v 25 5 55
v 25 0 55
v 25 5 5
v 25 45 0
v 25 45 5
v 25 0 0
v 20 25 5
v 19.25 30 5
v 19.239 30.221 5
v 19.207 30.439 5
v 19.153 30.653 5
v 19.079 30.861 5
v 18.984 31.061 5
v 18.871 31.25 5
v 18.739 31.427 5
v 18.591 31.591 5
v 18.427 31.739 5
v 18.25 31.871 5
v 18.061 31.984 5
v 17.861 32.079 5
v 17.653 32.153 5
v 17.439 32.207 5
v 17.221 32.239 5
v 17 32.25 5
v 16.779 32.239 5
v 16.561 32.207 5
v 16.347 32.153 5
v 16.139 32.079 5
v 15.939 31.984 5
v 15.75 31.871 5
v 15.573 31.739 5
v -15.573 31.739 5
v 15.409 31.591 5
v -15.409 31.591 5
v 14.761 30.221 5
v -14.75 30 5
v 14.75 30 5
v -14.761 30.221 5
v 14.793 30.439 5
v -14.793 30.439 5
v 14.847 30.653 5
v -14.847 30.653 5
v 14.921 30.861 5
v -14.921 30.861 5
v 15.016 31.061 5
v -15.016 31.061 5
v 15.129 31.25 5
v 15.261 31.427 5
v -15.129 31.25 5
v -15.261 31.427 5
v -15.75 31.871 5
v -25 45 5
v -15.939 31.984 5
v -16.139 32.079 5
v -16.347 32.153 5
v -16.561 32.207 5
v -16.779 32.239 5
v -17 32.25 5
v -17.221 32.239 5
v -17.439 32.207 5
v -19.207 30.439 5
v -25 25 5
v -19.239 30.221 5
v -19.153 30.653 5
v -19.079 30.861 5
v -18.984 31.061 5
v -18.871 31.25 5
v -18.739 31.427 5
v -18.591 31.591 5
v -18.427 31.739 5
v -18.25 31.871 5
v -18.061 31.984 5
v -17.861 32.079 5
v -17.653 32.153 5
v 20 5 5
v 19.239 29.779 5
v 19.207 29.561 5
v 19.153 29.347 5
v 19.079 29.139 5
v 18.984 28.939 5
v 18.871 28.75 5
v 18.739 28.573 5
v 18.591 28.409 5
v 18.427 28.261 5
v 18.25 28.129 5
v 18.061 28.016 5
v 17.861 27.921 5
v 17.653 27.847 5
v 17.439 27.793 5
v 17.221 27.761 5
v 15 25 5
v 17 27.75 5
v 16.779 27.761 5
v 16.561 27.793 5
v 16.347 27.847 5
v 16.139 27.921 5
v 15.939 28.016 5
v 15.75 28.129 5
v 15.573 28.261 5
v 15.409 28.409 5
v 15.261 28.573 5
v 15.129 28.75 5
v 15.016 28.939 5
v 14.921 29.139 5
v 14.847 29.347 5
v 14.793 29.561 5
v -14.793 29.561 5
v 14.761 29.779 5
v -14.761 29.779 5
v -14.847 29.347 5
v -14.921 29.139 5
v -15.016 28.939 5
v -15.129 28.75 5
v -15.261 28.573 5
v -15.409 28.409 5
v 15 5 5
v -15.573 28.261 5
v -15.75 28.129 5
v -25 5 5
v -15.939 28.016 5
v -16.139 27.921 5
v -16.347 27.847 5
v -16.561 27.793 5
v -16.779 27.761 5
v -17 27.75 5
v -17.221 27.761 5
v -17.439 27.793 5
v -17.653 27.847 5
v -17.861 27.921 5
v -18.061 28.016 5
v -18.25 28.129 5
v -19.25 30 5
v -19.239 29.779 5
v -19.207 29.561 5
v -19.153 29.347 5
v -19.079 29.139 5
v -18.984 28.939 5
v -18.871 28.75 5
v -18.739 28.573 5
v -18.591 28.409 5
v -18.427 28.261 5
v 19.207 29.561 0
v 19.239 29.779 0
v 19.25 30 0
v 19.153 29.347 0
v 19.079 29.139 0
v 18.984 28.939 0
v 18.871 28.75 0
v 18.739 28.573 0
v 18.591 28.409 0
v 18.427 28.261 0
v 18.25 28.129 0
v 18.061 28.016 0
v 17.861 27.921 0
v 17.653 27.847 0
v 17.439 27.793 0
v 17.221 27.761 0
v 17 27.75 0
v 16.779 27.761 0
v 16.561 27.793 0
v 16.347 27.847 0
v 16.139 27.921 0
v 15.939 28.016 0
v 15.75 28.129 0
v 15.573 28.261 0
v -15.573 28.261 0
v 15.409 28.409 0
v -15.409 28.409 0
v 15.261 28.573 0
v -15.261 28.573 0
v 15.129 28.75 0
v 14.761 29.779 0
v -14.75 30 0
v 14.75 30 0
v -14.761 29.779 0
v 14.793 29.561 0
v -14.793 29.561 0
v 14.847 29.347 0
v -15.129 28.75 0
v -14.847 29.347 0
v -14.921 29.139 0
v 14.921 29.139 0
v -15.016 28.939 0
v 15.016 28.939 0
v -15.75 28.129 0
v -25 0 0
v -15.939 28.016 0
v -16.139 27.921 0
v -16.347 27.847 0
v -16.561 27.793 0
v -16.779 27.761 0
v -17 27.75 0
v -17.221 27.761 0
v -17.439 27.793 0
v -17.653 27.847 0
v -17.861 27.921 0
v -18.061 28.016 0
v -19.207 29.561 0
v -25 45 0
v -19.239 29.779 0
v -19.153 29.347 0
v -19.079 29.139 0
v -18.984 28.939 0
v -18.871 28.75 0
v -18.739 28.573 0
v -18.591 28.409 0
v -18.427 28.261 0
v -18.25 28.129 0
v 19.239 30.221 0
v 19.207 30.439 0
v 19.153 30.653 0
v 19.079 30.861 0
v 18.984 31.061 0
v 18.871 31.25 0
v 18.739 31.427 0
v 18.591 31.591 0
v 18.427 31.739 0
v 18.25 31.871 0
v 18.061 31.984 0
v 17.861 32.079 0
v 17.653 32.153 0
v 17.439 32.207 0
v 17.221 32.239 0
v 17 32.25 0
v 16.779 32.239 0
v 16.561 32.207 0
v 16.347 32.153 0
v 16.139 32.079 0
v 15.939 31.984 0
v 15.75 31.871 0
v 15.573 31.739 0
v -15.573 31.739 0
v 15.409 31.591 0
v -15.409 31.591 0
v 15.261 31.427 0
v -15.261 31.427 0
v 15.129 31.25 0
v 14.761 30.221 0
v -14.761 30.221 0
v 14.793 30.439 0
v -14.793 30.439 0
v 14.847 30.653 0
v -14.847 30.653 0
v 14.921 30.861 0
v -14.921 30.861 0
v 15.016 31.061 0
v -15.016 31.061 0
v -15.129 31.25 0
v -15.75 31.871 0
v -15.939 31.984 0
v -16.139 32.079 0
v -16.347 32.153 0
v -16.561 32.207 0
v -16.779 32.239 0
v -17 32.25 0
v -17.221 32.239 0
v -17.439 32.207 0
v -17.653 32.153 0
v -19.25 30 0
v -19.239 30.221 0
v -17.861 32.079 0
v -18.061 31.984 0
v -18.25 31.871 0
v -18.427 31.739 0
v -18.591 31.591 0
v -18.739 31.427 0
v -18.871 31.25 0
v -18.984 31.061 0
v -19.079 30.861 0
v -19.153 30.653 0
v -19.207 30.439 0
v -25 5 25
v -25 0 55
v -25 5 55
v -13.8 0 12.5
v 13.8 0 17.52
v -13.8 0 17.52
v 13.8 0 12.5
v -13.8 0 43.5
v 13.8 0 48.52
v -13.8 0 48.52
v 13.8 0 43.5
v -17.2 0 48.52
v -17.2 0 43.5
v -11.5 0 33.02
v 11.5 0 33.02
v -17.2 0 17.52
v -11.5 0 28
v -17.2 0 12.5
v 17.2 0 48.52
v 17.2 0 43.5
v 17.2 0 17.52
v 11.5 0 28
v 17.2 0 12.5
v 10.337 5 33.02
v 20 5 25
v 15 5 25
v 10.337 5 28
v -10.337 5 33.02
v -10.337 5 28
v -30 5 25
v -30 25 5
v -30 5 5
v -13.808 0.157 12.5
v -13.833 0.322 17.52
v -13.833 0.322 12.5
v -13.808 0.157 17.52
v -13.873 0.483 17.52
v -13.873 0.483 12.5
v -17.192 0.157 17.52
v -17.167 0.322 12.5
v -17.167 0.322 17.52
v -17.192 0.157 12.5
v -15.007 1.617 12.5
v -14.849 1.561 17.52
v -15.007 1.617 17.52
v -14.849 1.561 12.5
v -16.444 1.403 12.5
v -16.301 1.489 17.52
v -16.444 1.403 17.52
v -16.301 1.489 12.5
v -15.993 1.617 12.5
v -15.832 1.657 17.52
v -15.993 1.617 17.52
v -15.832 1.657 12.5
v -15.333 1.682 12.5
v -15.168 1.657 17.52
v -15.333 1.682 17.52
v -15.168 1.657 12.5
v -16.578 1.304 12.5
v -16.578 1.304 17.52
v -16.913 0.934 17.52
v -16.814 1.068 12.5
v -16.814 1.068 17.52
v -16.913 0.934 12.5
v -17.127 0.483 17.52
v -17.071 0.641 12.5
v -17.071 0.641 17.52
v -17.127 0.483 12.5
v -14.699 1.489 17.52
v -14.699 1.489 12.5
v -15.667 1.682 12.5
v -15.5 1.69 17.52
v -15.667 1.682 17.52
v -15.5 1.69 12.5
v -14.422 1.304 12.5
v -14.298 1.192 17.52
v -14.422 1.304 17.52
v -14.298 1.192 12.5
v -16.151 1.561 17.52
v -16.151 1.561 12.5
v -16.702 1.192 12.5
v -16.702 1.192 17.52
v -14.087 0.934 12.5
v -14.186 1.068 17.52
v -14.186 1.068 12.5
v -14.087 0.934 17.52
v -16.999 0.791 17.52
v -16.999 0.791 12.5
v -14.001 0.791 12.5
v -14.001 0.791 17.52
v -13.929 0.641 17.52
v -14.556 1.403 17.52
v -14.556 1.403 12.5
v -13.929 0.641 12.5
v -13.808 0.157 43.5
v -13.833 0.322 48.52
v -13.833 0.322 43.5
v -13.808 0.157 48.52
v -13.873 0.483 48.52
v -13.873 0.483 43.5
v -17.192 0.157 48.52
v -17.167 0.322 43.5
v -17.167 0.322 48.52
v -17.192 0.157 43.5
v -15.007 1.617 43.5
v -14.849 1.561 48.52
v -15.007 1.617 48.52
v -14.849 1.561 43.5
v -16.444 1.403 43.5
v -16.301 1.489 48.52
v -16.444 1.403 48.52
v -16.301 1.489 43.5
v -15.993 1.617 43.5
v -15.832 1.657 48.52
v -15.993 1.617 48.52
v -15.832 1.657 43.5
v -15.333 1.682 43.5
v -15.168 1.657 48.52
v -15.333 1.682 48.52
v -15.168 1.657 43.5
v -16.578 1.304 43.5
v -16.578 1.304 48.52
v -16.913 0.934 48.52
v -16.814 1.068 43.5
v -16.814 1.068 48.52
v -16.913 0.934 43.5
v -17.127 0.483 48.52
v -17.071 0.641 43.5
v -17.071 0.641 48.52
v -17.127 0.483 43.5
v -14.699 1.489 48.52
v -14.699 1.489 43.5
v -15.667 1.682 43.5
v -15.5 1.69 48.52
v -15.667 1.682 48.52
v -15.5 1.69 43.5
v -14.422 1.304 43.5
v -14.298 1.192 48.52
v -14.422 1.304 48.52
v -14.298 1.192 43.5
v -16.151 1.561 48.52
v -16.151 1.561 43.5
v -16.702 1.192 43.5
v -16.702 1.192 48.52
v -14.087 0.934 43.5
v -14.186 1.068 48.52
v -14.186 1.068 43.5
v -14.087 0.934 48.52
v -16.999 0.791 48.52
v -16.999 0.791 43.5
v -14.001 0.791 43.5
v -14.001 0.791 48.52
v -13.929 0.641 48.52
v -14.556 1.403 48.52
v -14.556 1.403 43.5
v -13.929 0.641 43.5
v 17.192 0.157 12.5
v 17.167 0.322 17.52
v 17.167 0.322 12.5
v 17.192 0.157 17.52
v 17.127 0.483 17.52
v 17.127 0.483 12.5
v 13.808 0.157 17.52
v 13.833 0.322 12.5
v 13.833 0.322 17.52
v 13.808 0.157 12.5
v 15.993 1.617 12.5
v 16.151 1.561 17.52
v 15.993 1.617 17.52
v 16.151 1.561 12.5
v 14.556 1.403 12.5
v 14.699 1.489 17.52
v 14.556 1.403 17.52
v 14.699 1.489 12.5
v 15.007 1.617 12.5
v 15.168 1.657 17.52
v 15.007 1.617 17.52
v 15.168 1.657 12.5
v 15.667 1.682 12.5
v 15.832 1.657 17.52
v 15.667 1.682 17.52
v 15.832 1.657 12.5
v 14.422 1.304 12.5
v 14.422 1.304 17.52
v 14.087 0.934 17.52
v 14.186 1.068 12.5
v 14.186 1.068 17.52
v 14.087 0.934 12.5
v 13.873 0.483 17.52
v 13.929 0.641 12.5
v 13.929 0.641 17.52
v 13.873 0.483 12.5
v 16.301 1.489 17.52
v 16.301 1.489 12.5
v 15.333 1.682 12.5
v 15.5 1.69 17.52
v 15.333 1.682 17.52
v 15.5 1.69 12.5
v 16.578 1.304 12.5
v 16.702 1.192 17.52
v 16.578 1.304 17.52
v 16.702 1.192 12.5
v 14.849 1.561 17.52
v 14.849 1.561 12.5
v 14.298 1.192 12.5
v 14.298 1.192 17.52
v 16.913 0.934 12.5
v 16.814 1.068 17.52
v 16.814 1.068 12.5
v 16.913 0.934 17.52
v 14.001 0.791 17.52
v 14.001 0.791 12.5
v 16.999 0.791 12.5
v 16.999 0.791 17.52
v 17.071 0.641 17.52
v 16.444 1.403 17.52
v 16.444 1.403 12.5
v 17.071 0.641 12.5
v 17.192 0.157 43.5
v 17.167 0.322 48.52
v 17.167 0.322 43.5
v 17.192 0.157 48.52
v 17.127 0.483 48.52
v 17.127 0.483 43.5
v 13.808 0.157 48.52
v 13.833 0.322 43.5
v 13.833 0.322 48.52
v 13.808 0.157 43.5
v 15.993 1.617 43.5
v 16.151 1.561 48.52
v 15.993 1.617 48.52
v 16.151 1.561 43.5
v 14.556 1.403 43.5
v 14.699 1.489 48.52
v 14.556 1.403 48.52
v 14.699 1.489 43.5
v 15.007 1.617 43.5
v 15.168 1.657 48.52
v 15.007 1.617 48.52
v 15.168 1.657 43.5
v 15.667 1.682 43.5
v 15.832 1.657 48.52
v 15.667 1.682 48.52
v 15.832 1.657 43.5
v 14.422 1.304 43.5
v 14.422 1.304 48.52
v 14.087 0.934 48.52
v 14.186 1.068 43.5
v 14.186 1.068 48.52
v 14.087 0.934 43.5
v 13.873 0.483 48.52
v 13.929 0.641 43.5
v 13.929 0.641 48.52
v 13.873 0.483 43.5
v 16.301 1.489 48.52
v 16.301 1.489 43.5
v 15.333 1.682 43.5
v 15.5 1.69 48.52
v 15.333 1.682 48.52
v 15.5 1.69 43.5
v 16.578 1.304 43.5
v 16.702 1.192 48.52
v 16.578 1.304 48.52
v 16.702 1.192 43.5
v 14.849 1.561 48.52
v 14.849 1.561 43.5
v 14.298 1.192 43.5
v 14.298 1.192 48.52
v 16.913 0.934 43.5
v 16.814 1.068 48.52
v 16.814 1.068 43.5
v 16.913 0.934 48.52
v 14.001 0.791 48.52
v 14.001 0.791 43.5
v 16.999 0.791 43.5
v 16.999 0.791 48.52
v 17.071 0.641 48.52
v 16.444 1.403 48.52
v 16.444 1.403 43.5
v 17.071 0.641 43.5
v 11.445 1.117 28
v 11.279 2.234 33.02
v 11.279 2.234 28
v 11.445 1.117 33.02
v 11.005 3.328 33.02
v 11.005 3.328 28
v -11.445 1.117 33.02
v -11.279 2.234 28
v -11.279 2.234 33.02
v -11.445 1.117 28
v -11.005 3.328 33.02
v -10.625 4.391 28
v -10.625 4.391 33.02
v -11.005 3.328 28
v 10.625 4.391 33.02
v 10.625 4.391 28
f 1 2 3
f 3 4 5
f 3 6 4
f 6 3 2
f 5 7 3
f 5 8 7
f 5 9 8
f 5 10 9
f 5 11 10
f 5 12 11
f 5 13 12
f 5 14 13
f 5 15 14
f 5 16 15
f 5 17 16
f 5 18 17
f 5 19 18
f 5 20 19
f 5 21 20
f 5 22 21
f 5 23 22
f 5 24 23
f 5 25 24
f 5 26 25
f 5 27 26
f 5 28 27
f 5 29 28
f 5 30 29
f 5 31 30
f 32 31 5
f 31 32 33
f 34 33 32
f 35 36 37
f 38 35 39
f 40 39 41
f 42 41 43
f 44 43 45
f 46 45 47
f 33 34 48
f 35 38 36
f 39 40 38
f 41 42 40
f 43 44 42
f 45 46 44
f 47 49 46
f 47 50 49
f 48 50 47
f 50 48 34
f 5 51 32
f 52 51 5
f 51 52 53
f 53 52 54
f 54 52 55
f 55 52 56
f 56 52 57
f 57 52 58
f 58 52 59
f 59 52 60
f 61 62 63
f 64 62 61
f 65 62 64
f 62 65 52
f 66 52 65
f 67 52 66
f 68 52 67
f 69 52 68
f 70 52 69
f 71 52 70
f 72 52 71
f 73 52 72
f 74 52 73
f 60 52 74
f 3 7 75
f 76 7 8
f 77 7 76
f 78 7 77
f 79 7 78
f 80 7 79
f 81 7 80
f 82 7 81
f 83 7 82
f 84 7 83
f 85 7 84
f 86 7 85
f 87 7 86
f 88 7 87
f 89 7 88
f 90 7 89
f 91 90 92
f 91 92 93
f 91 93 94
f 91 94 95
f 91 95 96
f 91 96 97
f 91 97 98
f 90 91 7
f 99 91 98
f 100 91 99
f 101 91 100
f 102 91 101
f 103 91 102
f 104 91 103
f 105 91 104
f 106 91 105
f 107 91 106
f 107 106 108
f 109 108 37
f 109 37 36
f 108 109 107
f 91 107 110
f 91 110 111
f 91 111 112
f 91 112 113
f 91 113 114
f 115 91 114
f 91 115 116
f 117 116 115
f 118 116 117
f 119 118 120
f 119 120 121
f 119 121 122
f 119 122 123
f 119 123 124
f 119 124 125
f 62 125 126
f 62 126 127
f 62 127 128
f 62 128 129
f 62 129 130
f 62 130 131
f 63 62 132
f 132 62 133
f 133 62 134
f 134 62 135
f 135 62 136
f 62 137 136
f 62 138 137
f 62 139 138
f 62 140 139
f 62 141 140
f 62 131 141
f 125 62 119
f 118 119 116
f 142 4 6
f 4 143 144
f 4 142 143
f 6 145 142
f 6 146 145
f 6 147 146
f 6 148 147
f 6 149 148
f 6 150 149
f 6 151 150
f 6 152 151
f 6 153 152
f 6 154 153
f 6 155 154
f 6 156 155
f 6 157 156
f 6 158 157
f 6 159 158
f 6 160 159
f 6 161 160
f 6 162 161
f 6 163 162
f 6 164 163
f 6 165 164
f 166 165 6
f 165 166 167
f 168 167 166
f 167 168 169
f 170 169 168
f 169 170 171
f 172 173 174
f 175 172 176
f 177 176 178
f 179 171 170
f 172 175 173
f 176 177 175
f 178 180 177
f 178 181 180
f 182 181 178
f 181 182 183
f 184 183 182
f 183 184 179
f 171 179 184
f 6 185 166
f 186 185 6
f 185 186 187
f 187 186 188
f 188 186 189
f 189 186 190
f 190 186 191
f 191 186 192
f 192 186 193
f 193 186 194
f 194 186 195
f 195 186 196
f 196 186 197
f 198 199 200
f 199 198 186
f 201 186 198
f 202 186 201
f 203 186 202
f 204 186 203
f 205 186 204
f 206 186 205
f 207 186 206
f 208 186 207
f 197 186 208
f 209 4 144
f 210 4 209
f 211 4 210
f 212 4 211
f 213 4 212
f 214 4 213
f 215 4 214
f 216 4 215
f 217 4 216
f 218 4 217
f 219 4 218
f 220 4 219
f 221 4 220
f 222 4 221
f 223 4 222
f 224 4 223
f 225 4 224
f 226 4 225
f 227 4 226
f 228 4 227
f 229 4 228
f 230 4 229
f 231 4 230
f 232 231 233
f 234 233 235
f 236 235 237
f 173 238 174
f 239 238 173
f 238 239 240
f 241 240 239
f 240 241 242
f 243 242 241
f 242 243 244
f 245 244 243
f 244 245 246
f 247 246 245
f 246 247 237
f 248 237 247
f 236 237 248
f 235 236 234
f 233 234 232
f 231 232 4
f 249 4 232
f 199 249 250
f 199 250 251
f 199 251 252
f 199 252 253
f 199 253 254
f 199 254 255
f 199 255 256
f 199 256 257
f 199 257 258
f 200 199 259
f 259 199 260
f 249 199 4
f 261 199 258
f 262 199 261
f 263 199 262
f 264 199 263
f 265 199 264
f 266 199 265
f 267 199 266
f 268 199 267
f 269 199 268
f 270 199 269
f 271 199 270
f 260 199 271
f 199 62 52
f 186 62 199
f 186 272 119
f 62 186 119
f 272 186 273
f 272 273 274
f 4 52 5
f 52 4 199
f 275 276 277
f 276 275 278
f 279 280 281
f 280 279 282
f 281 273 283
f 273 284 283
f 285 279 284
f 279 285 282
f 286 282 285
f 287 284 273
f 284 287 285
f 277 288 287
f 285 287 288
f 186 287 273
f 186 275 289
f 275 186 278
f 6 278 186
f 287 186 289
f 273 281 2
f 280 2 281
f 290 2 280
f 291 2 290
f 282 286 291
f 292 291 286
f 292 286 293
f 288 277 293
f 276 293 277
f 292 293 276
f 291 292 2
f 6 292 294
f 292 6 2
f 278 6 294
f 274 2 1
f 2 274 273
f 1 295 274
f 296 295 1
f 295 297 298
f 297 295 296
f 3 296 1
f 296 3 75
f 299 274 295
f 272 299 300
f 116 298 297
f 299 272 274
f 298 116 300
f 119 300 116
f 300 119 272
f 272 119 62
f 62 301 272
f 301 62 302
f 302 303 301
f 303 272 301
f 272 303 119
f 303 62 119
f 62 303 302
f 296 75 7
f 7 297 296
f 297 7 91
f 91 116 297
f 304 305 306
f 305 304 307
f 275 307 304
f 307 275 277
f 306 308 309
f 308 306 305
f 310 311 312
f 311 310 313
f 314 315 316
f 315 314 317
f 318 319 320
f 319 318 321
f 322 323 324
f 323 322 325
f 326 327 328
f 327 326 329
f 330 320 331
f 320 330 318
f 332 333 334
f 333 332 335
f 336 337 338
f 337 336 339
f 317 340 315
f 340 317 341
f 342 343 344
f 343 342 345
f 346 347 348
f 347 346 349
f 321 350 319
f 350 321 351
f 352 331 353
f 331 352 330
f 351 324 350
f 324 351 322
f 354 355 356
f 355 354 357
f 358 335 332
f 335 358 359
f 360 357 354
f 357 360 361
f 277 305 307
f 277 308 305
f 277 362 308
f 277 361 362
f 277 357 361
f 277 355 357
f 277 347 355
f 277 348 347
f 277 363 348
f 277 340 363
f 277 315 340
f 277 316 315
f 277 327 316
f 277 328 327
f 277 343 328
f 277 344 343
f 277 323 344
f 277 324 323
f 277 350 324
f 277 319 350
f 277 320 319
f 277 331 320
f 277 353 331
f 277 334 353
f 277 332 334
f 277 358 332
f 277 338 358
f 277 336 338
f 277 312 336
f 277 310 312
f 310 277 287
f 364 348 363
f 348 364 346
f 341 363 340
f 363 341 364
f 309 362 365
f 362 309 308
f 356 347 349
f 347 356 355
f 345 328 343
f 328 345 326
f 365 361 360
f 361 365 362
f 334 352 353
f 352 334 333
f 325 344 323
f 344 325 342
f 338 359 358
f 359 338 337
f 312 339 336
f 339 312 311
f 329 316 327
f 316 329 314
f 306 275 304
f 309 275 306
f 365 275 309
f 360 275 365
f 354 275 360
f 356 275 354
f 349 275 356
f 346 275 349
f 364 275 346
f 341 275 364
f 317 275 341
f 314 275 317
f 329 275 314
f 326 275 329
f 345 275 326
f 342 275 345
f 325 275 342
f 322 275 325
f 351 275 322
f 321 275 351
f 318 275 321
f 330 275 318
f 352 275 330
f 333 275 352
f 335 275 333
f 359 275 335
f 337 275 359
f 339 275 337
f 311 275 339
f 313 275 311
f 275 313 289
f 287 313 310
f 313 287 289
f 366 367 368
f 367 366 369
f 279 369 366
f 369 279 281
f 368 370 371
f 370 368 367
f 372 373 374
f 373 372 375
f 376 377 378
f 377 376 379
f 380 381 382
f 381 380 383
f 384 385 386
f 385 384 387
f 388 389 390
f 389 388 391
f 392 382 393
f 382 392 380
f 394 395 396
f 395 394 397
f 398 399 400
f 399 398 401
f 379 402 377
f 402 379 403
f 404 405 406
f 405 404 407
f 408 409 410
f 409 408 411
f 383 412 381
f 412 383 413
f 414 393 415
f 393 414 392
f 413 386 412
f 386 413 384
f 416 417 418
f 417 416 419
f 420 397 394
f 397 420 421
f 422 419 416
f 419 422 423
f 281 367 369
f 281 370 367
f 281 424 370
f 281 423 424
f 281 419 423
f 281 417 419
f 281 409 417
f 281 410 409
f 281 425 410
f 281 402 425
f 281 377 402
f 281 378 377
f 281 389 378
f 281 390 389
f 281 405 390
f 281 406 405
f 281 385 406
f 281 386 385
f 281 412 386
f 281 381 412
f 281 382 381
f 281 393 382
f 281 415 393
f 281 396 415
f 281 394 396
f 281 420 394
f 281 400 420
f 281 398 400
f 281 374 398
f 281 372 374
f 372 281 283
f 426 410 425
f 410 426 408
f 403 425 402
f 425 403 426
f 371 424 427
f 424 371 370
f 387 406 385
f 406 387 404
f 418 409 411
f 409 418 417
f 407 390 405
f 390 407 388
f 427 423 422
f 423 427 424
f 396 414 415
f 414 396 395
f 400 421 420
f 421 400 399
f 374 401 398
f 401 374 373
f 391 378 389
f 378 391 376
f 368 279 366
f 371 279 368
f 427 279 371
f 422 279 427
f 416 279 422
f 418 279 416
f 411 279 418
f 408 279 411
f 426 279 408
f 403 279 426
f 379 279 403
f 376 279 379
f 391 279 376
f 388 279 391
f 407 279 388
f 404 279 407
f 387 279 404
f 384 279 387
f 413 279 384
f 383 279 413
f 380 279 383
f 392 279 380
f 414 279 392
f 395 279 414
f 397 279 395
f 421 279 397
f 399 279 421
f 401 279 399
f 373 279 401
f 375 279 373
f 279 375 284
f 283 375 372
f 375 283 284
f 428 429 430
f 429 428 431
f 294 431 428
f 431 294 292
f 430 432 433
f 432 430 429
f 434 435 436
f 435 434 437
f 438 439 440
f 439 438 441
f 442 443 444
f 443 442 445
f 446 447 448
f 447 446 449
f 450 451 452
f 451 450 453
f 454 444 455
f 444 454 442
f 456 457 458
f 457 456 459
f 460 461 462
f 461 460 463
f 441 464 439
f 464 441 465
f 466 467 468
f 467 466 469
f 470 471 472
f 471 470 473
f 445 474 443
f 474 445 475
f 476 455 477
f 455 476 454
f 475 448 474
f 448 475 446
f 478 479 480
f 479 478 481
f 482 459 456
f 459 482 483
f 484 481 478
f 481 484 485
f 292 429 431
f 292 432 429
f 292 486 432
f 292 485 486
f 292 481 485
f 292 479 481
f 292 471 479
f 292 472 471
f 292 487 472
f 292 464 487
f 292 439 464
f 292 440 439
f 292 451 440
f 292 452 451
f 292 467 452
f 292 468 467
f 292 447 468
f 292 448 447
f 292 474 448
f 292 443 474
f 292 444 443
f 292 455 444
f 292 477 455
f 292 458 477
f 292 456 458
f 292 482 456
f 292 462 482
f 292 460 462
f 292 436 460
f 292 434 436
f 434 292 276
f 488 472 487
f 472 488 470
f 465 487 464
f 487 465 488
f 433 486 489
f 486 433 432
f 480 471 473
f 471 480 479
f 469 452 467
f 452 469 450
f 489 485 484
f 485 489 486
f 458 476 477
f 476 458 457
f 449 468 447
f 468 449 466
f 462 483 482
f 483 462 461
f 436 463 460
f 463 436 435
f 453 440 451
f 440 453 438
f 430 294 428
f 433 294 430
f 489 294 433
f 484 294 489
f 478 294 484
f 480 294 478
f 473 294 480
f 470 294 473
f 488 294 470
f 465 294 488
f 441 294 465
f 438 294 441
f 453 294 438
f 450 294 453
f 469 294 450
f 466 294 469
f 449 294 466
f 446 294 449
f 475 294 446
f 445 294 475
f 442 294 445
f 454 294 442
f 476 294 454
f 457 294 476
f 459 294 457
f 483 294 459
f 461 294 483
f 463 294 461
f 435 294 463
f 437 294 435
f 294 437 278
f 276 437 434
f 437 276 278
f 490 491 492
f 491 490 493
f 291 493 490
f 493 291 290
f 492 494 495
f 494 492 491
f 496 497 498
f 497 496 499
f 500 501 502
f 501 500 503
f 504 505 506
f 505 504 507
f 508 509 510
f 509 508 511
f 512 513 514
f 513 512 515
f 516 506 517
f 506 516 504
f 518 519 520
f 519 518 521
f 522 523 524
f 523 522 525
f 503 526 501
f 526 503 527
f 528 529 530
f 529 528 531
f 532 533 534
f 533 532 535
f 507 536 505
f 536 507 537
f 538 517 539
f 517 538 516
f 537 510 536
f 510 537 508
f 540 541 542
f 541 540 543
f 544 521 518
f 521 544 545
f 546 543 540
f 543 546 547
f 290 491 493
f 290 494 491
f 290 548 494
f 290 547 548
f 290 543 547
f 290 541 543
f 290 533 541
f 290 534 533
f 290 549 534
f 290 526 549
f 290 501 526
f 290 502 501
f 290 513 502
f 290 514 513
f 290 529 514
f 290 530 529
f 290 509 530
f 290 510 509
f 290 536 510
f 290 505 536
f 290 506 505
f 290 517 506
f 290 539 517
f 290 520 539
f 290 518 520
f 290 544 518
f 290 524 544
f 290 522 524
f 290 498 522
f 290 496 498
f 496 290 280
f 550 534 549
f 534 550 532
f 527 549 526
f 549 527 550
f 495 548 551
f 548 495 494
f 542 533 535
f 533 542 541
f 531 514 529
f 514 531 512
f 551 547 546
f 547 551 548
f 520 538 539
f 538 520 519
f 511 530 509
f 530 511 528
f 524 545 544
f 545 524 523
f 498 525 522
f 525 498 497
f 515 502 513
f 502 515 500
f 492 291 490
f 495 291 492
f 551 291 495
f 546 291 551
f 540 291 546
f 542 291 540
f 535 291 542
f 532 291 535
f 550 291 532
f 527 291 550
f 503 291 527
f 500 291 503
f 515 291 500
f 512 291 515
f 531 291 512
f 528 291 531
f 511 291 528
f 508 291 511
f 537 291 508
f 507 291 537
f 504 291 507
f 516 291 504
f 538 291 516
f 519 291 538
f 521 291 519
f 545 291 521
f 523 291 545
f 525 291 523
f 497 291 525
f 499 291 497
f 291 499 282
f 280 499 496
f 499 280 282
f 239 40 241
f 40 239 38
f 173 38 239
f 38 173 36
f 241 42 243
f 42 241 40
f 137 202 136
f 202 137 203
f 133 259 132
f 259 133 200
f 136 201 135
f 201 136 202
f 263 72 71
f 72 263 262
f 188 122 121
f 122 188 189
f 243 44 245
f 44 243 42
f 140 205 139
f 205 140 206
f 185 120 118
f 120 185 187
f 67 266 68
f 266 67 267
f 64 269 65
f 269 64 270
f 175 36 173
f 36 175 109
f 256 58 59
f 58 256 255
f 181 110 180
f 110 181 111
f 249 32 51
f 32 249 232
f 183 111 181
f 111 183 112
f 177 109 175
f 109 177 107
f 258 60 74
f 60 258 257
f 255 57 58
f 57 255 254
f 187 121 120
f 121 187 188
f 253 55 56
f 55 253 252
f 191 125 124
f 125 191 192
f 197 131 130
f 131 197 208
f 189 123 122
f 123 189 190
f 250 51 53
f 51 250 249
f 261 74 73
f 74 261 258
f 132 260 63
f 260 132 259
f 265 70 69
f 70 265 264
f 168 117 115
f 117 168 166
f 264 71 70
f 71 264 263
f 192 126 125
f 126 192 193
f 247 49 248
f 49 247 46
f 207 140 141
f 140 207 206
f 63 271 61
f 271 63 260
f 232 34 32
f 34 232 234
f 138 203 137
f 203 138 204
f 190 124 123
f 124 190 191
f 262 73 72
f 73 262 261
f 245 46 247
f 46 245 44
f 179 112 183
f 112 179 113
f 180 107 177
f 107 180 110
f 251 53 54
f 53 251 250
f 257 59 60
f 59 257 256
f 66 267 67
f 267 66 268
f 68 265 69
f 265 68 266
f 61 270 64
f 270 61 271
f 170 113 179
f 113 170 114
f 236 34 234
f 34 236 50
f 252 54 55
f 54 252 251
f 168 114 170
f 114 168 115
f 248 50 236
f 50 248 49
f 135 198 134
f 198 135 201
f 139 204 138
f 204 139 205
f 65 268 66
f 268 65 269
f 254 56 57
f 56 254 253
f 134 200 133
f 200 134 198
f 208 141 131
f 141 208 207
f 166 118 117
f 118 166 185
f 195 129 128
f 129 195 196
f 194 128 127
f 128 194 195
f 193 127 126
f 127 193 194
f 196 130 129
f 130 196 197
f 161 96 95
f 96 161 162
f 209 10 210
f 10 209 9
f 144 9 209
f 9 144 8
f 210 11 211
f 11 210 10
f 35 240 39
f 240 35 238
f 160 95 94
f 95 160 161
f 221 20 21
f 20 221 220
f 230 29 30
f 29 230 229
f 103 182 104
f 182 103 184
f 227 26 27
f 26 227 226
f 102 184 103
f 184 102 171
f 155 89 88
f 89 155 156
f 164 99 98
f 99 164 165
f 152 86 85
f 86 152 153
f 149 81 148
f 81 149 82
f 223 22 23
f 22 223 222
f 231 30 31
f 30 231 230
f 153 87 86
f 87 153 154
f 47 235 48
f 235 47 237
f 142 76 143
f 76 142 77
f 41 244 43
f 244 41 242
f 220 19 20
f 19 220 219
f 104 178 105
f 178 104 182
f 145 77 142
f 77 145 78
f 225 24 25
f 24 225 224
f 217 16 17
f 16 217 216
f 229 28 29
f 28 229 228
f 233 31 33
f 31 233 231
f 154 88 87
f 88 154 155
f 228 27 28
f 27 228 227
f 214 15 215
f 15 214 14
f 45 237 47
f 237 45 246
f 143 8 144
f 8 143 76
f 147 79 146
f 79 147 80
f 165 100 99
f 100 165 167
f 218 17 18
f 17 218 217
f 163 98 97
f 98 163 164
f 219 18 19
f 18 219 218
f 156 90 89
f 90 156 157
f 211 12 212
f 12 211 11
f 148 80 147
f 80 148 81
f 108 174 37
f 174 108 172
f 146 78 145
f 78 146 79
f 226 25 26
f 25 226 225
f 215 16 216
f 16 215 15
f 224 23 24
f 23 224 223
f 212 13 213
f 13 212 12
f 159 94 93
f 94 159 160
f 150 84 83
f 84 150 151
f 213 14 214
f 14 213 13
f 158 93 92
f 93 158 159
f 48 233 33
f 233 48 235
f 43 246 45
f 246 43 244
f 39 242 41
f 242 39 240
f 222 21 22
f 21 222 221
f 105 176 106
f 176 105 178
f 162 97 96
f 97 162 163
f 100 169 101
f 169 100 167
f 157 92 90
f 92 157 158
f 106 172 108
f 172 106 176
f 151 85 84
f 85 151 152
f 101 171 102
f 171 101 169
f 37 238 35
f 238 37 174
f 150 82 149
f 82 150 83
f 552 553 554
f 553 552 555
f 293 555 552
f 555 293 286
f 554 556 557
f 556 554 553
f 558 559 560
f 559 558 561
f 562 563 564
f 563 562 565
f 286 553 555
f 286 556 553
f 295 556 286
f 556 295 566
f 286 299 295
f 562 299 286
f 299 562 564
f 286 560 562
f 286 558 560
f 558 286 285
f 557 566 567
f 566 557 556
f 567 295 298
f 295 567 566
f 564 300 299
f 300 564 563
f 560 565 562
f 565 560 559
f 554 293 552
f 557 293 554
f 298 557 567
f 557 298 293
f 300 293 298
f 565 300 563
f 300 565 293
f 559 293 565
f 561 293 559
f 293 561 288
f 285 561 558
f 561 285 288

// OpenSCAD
// NEMA 17 Stepper Motor L-Bracket for Syringe Pump
// Corrected version to ensure watertightness and correct geometry

// --- Dimensions ---
// Base Plate
base_width_x = 50;           // Total width (-25 to 25)
base_depth_y = 45;           // Total depth (0 to 45)
base_height_z = 5;           // Thickness of base
base_hole_dia = 4.5;         // M4 screw holes
base_hole_x1 = -17;          // X position of hole 1
base_hole_x2 = 17;           // X position of hole 2
base_hole_y = 30;            // Y position of holes

// Vertical Motor Plate
motor_plate_width_x = 50;    // Total width (-25 to 25)
motor_plate_depth_y = 5;     // Thickness of vertical plate
motor_plate_height_z = 50;   // Total height (0 to 50)

// Motor Mounting Features (on Vertical Plate)
boss_hole_dia = 23;          // Centering boss hole diameter
boss_hole_x = 0;             // Center X of boss hole
boss_hole_z = 28;            // Center Z of boss hole
boss_hole_y_offset = 2.5;    // Center of hole in Y (half of plate thickness)

screw_hole_dia = 3.4;        // M3 screw holes
screw_pattern_size = 31;     // Square pattern for M3 screws
screw_offset = screw_pattern_size / 2;

// Gussets
gusset_thickness = 5;        // Thickness of gussets
gusset_leg_y = 20;           // Leg length along Y
gusset_leg_z = 20;           // Leg length along Z
gusset_x_outer = 25;         // Outer X edge
gusset_x_inner = 20;         // Inner X edge

// --- Constants ---
$fn = 64;
eps = 0.01; // Small epsilon for watertightness

// --- Main Assembly ---

// We use a single union/difference structure to ensure a single watertight manifold
difference() {
    // The combined solid geometry
    union() {
        // 1. Base Plate
        translate([-base_width_x/2, 0, 0])
            cube([base_width_x, base_depth_y, base_height_z]);

        // 2. Vertical Motor Plate
        // Positioned at the back edge (y=0 to y=5)
        translate([-motor_plate_width_x/2, 0, base_height_z])
            cube([motor_plate_width_x, motor_plate_depth_y, motor_plate_height_z]);

        // 3. Gussets
        // Left Gusset: Right triangle in YZ plane, legs 20mm along Y and Z
        // Corner at y=5 (relative to base), z=5 (relative to base)
        // Note: The specification says "right-angle corner at y=5, z=5 (where the plates meet)"
        // Since base is 5mm thick, the plates meet at z=5.
        // The gusset is flush with the left edge (x=-25 to -20)
        translate([-gusset_x_outer, 5, 5])
            rotate([0, -90, 0]) 
                linear_extrude(gusset_thickness)
                    polygon(points=[[0,0], [gusset_leg_y, 0], [0, gusset_leg_z]]);

        // Right Gusset: Flush with right edge (x=20 to 25)
        translate([gusset_x_inner, 5, 5])
            rotate([0, -90, 0]) 
                linear_extrude(gusset_thickness)
                    polygon(points=[[0,0], [gusset_leg_y, 0], [0, gusset_leg_z]]);
    }

    // --- Subtraction Operations ---

    // M4 Holes in Base Plate
    translate([base_hole_x1, base_hole_y, -eps])
        cylinder(d=base_hole_dia, h=base_height_z + 2*eps);
    translate([base_hole_x2, base_hole_y, -eps])
        cylinder(d=base_hole_dia, h=base_height_z + 2*eps);

    // Boss Centering Hole (through the vertical plate)
    // Plate is at y=0 to 5. Center is at y=2.5.
    translate([boss_hole_x, -eps, boss_hole_z])
        cylinder(d=boss_hole_dia, h=motor_plate_depth_y + 2*eps);

    // M3 Screw Holes (4 holes in square pattern)
    // Centered on the boss hole (0, 28)
    for (px = [-screw_offset, screw_offset]) {
        for (pz = [-screw_offset, screw_offset]) {
            translate([px, -eps, boss_hole_z + pz])
                cylinder(d=screw_hole_dia, h=motor_plate_depth_y + 2*eps);
        }
    }
}
